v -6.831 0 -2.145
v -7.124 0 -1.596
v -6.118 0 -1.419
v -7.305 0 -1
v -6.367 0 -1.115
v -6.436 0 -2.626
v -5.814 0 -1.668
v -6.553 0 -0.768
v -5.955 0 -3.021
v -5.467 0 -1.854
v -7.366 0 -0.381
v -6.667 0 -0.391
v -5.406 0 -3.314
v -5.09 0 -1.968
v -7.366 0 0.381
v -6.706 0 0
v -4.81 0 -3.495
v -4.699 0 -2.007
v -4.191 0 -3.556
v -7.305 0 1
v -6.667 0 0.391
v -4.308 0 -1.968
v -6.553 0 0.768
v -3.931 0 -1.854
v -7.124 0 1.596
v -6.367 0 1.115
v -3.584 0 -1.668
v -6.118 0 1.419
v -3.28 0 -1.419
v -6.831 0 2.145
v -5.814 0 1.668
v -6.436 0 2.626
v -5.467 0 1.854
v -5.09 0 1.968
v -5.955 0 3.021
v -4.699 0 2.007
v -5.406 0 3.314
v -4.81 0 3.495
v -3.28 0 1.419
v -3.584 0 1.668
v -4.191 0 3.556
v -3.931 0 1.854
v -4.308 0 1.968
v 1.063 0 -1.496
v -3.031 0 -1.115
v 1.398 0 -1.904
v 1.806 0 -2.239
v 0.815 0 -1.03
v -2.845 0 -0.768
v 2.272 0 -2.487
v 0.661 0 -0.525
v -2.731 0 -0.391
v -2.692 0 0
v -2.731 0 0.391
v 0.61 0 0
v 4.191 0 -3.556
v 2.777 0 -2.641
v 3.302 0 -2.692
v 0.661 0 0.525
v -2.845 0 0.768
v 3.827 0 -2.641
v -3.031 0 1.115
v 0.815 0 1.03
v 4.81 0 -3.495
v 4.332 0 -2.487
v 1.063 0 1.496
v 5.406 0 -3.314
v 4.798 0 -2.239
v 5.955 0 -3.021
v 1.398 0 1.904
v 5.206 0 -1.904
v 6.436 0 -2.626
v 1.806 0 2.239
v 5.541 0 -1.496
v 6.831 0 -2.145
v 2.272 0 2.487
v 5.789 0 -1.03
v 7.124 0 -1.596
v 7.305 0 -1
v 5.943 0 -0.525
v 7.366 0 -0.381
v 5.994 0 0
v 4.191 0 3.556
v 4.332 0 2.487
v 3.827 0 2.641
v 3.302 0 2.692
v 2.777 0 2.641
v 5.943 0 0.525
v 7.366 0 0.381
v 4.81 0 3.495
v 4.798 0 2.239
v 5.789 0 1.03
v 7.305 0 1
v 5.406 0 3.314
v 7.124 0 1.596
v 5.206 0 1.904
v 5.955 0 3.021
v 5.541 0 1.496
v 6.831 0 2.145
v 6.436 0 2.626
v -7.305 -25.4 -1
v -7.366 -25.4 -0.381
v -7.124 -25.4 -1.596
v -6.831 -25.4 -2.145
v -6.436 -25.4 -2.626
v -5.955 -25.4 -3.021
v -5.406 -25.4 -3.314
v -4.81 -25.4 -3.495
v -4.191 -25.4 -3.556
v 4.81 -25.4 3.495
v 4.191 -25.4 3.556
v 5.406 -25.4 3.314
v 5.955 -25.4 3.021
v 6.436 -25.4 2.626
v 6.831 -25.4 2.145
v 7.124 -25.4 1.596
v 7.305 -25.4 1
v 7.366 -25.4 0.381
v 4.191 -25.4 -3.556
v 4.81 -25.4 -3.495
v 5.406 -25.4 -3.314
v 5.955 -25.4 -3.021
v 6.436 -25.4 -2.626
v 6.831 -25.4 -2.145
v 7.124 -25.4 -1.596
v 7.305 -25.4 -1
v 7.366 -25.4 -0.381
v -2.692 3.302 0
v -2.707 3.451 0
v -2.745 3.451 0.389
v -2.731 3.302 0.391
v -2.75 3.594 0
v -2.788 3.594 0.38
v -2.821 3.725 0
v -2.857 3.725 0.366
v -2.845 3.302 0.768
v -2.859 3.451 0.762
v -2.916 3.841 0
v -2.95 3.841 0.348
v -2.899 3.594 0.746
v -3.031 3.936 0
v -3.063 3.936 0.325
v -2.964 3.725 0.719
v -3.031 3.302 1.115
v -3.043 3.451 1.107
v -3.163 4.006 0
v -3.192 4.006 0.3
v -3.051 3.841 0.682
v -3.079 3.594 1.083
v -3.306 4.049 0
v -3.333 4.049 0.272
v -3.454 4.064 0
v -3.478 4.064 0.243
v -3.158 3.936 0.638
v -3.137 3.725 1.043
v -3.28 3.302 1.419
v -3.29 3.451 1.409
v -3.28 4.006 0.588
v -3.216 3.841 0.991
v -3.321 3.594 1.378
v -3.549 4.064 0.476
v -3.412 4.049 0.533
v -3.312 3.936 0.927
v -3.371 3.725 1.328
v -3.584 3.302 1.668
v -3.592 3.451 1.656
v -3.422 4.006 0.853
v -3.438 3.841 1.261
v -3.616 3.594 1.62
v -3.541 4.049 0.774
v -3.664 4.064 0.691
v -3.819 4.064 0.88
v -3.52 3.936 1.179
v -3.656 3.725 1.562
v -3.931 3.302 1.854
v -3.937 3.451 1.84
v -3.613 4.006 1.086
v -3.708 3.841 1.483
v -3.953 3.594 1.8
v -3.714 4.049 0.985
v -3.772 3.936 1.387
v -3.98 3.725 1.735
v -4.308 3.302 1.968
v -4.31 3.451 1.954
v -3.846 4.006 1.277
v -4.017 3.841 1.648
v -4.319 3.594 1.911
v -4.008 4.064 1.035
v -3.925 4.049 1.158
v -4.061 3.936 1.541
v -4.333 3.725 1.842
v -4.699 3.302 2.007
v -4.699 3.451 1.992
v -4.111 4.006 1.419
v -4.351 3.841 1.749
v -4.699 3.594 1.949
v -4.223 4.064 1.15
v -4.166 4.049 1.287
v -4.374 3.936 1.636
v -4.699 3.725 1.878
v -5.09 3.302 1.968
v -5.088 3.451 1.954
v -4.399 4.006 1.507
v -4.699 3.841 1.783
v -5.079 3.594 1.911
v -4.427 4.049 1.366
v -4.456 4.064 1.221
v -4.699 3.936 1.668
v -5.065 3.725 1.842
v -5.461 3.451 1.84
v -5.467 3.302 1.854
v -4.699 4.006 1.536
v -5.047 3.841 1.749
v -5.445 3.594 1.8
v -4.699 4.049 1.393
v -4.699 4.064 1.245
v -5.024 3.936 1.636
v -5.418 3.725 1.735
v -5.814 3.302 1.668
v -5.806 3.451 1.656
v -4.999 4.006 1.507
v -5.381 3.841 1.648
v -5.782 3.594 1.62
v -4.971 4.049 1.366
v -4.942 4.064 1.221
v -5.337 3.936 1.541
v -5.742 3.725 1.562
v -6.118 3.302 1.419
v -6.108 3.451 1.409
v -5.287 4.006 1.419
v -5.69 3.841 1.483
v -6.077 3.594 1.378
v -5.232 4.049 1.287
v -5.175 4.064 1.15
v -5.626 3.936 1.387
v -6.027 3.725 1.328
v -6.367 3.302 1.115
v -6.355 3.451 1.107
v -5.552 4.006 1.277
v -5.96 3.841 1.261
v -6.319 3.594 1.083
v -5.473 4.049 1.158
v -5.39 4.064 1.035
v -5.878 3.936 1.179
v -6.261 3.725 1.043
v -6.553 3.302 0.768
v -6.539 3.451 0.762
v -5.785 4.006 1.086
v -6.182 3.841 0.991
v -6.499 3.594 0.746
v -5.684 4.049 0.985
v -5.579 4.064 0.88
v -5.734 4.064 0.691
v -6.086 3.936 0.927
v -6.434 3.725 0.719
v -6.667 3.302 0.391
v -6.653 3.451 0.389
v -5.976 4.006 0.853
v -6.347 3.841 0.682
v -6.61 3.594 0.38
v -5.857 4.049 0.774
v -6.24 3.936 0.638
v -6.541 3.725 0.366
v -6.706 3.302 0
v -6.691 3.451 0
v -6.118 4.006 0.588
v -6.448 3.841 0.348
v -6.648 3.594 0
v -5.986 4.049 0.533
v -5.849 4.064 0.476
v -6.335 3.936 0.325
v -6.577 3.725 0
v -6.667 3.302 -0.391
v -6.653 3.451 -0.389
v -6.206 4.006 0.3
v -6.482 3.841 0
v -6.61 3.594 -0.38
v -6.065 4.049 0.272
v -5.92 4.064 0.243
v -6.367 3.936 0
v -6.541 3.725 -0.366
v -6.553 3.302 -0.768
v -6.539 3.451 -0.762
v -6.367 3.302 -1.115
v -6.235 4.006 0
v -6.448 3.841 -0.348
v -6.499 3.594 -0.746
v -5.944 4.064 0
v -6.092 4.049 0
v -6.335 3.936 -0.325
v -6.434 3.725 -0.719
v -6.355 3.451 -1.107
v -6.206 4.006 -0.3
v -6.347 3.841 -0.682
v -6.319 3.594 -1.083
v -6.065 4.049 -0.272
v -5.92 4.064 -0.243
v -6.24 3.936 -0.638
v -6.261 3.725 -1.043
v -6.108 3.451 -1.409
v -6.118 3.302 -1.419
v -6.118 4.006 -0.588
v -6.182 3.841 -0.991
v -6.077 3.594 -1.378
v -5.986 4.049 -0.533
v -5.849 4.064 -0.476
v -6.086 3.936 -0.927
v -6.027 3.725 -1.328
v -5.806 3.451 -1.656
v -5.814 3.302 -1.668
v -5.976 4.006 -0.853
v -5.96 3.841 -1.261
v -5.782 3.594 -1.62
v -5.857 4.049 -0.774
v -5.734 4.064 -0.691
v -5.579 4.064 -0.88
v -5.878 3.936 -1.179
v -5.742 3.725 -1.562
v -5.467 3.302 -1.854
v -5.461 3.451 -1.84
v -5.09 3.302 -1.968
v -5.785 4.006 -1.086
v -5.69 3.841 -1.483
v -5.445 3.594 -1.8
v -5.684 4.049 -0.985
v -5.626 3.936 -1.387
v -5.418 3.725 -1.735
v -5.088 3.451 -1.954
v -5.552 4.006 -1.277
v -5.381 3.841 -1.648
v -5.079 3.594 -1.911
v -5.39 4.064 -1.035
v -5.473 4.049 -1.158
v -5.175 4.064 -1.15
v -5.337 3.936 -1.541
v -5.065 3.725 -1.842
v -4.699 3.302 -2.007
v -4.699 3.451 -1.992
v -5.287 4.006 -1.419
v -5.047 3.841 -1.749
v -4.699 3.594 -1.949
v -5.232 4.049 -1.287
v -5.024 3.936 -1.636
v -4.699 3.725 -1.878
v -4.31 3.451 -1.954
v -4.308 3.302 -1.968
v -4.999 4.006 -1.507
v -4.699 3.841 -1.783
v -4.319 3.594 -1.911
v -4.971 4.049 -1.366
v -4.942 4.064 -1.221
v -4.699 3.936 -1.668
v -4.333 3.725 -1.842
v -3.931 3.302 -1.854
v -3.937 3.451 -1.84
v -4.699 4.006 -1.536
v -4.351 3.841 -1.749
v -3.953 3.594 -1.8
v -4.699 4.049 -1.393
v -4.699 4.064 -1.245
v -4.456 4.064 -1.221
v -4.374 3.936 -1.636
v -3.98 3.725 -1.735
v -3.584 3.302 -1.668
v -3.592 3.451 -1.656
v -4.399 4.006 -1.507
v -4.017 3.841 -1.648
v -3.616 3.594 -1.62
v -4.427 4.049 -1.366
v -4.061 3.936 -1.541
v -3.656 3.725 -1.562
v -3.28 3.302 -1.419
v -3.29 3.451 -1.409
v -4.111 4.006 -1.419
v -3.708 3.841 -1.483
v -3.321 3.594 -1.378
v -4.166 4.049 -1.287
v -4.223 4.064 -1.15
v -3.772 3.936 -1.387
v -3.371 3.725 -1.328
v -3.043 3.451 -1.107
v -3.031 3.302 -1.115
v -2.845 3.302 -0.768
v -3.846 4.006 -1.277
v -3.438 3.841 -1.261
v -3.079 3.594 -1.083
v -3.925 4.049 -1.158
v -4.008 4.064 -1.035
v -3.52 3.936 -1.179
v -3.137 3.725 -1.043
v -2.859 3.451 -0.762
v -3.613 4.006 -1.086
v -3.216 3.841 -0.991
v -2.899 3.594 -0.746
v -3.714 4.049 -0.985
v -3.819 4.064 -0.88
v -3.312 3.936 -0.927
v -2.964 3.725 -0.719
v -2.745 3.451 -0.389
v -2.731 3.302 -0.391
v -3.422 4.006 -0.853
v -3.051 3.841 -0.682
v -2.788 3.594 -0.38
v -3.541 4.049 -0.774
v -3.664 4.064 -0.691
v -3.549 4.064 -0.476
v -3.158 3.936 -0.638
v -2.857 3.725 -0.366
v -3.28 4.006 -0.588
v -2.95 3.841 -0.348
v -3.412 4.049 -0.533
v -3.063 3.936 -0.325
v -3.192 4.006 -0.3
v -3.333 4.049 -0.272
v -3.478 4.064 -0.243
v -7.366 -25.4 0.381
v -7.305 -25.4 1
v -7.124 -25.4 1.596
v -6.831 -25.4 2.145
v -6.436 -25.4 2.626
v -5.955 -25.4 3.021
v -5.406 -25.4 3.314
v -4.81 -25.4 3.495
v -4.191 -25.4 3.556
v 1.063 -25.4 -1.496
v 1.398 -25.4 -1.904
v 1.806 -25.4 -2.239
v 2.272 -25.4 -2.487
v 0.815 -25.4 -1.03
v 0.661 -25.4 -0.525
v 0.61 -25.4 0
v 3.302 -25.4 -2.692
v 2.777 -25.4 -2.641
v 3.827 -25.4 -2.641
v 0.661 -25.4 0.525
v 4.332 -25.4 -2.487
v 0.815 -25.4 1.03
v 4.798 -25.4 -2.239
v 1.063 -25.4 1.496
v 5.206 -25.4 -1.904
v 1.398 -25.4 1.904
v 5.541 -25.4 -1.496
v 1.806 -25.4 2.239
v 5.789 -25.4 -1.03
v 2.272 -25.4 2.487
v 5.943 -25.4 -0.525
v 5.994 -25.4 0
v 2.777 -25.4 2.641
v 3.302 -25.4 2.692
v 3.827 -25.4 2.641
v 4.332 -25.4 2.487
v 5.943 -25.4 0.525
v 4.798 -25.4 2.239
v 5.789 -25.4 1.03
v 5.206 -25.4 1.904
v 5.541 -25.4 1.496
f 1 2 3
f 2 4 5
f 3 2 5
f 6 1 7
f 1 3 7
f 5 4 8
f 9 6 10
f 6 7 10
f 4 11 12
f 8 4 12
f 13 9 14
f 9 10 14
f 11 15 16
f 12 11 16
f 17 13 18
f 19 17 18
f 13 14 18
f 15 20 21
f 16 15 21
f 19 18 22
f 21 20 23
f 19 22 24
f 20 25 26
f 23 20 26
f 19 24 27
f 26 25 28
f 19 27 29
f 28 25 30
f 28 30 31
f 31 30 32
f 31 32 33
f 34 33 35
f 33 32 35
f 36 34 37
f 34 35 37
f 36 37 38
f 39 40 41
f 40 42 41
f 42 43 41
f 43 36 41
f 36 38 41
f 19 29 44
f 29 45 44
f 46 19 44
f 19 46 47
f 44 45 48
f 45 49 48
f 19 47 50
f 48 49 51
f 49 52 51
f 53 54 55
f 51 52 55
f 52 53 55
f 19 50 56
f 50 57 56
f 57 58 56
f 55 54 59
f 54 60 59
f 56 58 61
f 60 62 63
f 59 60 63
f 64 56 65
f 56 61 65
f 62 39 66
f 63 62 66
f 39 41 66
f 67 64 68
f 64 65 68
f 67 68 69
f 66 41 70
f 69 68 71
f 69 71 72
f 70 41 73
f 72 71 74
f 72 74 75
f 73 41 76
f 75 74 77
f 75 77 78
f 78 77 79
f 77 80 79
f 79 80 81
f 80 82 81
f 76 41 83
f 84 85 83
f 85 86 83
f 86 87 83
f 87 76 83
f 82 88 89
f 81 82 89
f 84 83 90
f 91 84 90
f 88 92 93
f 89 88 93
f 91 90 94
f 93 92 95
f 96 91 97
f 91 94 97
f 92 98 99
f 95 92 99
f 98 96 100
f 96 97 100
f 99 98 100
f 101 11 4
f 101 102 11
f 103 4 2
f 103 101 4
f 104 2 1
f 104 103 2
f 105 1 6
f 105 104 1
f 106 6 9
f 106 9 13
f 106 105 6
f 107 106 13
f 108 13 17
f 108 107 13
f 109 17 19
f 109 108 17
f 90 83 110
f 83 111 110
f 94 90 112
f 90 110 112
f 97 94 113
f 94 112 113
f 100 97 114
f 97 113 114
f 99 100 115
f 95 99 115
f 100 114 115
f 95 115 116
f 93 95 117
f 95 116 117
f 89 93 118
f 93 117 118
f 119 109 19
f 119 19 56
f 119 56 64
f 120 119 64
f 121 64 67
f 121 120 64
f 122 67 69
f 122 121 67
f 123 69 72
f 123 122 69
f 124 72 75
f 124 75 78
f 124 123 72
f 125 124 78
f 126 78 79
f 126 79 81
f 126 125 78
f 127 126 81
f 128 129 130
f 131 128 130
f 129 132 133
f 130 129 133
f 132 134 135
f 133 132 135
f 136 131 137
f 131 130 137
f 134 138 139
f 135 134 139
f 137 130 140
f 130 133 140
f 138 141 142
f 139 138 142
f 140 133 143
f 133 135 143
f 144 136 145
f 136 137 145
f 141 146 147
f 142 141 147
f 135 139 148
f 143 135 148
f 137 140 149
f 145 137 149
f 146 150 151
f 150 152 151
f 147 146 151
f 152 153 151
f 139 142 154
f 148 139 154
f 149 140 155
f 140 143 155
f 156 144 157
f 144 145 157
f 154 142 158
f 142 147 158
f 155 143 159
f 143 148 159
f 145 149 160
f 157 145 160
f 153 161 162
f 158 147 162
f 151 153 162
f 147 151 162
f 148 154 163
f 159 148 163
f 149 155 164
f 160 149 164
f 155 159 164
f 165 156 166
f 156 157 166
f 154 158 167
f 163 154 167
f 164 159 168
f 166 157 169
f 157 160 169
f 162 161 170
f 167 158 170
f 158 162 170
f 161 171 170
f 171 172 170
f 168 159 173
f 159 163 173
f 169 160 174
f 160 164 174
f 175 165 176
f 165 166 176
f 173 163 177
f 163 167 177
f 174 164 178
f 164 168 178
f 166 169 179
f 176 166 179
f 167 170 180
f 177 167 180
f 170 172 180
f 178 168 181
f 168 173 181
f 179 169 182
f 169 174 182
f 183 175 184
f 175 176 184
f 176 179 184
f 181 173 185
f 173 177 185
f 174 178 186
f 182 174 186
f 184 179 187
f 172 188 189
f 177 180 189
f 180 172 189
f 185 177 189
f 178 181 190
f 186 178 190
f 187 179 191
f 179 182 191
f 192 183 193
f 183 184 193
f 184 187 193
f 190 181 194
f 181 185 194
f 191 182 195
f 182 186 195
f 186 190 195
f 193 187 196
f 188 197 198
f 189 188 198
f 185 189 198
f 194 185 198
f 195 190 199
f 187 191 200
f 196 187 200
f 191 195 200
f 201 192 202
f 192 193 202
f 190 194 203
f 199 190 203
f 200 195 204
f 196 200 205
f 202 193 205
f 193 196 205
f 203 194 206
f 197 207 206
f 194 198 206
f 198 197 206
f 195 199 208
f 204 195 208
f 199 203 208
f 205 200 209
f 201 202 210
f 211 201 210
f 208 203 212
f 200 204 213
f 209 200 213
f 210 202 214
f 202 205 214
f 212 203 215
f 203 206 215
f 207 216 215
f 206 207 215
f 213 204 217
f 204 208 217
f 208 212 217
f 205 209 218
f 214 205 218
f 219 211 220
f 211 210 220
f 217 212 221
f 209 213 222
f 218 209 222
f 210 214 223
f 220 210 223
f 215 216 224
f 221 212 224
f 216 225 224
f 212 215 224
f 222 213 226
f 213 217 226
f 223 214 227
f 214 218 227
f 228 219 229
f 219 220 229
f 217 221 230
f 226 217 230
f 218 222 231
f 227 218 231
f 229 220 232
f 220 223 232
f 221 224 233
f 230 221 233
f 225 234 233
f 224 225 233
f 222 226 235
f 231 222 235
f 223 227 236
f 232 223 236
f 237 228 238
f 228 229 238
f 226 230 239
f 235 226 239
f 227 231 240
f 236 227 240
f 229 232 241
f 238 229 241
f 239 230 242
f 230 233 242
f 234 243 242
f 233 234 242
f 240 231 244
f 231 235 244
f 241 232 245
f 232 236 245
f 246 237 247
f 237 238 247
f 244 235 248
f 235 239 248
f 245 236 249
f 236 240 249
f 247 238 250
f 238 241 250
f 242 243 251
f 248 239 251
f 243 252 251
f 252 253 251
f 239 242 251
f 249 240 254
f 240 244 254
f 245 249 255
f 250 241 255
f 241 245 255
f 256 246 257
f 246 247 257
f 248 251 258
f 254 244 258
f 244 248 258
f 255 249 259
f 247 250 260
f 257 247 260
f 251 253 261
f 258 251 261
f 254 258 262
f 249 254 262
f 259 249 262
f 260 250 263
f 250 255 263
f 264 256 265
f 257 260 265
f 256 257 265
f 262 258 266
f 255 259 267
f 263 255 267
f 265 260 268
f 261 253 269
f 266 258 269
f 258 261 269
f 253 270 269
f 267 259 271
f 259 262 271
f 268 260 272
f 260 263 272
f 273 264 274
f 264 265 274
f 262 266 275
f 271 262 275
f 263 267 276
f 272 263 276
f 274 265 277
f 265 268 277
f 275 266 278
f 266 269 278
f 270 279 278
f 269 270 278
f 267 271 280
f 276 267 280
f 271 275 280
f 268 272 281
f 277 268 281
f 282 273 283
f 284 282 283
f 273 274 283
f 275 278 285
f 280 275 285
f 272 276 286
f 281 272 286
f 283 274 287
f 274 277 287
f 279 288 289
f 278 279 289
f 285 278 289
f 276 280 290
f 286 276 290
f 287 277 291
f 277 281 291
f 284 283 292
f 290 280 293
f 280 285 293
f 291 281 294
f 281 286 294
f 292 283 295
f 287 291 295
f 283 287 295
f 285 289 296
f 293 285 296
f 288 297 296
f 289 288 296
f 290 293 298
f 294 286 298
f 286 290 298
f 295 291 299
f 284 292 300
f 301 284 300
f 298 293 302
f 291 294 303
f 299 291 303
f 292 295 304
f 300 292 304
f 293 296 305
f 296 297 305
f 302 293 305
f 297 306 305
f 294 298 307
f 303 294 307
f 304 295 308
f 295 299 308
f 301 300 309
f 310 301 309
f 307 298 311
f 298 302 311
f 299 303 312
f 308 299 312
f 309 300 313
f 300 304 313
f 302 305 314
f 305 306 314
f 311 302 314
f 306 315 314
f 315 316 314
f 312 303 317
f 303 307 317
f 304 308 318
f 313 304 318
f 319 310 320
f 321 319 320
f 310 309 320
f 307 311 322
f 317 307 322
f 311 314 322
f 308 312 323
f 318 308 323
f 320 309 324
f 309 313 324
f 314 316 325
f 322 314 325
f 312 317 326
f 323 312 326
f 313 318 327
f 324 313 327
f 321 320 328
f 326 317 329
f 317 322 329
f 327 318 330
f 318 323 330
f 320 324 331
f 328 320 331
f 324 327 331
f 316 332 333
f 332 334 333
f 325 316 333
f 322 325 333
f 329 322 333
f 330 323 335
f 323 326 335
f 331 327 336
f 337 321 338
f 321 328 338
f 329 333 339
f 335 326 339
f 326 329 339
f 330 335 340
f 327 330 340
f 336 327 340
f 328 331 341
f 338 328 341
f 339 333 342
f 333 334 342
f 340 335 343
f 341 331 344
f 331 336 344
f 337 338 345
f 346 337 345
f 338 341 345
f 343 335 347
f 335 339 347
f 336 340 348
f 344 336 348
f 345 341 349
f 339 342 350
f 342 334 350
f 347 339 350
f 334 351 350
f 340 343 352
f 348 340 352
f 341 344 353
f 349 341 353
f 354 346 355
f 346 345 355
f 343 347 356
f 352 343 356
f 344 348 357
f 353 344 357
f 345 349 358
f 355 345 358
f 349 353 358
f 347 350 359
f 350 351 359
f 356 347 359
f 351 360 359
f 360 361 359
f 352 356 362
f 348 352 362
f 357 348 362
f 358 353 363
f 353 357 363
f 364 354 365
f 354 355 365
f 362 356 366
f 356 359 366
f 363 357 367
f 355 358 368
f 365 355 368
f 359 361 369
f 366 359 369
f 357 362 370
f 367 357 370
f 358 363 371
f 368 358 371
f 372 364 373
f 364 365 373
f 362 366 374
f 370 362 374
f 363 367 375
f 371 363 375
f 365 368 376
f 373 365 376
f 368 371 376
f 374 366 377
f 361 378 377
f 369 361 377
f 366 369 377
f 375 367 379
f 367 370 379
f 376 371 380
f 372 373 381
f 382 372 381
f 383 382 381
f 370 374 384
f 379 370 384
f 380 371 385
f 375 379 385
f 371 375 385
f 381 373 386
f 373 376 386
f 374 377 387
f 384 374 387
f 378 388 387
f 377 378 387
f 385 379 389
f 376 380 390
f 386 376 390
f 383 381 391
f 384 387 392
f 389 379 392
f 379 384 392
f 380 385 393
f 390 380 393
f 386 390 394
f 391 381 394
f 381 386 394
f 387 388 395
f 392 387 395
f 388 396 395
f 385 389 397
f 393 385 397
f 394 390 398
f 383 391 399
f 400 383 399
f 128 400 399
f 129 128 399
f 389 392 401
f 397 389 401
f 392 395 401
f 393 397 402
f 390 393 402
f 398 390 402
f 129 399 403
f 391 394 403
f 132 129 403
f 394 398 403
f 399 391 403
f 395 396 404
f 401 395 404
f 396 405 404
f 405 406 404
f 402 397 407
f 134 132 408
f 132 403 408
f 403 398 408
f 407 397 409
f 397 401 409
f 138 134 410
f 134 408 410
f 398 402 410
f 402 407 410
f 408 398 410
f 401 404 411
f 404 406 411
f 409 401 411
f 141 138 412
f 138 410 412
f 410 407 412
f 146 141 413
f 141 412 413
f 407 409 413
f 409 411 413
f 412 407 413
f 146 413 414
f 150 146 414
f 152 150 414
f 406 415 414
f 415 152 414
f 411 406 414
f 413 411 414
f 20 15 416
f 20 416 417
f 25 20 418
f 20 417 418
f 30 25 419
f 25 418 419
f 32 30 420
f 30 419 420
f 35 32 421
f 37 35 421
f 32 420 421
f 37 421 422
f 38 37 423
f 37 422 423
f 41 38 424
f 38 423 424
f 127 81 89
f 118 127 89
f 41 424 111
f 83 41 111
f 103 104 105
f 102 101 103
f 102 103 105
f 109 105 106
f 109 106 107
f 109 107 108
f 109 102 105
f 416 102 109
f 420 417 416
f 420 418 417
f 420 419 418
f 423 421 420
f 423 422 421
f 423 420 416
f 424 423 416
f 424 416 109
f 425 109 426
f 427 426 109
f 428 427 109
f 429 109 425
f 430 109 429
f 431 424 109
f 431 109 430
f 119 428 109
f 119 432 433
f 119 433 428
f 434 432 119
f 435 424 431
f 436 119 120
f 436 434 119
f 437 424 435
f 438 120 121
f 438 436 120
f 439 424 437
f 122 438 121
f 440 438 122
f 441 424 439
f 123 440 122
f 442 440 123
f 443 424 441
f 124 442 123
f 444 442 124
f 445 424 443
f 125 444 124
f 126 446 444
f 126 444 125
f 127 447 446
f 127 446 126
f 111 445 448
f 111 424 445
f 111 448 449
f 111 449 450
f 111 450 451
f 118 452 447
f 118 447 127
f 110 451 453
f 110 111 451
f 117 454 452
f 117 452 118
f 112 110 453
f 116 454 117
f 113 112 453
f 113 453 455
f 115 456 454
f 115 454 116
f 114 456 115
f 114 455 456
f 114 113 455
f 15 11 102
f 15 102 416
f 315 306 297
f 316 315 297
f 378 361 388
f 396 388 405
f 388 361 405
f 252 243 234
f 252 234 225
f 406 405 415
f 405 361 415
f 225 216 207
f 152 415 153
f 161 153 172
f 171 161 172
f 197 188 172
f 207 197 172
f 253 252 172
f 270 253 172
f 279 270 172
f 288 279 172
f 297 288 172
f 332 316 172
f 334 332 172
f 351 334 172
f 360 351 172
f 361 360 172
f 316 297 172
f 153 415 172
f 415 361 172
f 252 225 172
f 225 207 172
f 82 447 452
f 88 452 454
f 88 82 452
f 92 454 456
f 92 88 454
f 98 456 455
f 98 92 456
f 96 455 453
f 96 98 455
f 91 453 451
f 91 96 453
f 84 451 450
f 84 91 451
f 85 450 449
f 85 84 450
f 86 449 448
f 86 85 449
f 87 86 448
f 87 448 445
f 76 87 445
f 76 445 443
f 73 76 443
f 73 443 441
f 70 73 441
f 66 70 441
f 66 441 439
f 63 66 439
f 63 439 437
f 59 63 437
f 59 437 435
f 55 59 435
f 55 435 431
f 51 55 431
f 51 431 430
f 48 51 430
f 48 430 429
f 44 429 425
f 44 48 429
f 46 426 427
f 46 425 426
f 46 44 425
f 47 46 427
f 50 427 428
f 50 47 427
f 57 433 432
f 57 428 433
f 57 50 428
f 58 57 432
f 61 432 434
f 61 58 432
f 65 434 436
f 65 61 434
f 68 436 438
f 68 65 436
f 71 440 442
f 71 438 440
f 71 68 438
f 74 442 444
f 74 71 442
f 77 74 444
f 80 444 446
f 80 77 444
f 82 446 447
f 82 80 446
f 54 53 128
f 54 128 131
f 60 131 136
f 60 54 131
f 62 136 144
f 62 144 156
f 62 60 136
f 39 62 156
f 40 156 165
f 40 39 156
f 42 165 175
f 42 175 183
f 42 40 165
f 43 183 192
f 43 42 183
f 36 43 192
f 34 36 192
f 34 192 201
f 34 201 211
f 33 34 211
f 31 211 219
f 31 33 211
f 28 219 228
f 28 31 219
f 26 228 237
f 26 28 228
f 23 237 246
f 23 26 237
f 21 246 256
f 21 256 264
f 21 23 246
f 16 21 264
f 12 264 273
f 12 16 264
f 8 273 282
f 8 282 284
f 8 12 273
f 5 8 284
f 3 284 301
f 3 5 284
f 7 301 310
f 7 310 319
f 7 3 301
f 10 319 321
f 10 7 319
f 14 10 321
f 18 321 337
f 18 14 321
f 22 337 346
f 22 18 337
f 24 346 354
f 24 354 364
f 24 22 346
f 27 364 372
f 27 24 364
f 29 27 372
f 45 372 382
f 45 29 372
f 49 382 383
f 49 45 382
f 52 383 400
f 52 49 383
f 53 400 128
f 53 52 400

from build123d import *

# Parameters (mm, degrees)
F0_W     = 14.732
F0_H     = 7.112
F0_R     = 2.0066
F0_R_2   = 2.6924
F1_DEPTH = 25.4
F2_DEPTH = 25.401
F3_DEPTH = 4.064
F4_R     = 1.3208
F5_DEPTH = 25.401
F6_R     = 0.762
F7_R     = 3.175


# Not quite as in the source:
# - a feature names something its author has since deleted; it is built from what else it names


with BuildPart() as f1:
    # F0 (on Front) → F1 (new body)
    with BuildSketch(Plane.XZ):
        Rectangle(F0_W, F0_H)
        with Locations((-4.699, 0)):
            Circle(F0_R, mode=Mode.SUBTRACT)
        with Locations((3.302, 0)):
            Circle(F0_R_2, mode=Mode.SUBTRACT)
        with Locations((3.302, 0)):
            Circle(F0_R_2)
        with Locations((-4.699, 0)):
            Circle(F0_R)
    extrude(amount=F1_DEPTH)

    # F0 (on Front) → F2 (cut, through all)
    with BuildSketch(Plane.XZ):
        with Locations((3.302, 0)):
            Circle(F0_R_2)
    extrude(amount=F2_DEPTH, mode=Mode.SUBTRACT)

    # F0 (on Front) → F3 (join)
    with BuildSketch(Plane.XZ):
        with Locations((-4.699, 0)):
            Circle(F0_R)
    extrude(amount=-F3_DEPTH)

    # F4 (on face) → F5 (cut, through all)
    with BuildSketch(Plane.XZ):
        with Locations((3.302, 0)):
            Circle(F4_R)
    extrude(amount=F5_DEPTH, mode=Mode.SUBTRACT)

    # F6
    f6_edges = [f1.edges().sort_by_distance(p)[0] for p in [
        (-6.7056, 4.064, 0),
    ]]
    fillet(f6_edges, radius=F6_R)

    # F7
    f7_edges = [f1.edges().sort_by_distance(p)[0] for p in [
        (7.366, -12.7, 3.556),
        (7.366, -12.7, -3.556),
        (-7.366, -12.7, -3.556),
        (-7.366, -12.7, 3.556),
    ]]
    fillet(f7_edges, radius=F7_R)


solid = f1.part
